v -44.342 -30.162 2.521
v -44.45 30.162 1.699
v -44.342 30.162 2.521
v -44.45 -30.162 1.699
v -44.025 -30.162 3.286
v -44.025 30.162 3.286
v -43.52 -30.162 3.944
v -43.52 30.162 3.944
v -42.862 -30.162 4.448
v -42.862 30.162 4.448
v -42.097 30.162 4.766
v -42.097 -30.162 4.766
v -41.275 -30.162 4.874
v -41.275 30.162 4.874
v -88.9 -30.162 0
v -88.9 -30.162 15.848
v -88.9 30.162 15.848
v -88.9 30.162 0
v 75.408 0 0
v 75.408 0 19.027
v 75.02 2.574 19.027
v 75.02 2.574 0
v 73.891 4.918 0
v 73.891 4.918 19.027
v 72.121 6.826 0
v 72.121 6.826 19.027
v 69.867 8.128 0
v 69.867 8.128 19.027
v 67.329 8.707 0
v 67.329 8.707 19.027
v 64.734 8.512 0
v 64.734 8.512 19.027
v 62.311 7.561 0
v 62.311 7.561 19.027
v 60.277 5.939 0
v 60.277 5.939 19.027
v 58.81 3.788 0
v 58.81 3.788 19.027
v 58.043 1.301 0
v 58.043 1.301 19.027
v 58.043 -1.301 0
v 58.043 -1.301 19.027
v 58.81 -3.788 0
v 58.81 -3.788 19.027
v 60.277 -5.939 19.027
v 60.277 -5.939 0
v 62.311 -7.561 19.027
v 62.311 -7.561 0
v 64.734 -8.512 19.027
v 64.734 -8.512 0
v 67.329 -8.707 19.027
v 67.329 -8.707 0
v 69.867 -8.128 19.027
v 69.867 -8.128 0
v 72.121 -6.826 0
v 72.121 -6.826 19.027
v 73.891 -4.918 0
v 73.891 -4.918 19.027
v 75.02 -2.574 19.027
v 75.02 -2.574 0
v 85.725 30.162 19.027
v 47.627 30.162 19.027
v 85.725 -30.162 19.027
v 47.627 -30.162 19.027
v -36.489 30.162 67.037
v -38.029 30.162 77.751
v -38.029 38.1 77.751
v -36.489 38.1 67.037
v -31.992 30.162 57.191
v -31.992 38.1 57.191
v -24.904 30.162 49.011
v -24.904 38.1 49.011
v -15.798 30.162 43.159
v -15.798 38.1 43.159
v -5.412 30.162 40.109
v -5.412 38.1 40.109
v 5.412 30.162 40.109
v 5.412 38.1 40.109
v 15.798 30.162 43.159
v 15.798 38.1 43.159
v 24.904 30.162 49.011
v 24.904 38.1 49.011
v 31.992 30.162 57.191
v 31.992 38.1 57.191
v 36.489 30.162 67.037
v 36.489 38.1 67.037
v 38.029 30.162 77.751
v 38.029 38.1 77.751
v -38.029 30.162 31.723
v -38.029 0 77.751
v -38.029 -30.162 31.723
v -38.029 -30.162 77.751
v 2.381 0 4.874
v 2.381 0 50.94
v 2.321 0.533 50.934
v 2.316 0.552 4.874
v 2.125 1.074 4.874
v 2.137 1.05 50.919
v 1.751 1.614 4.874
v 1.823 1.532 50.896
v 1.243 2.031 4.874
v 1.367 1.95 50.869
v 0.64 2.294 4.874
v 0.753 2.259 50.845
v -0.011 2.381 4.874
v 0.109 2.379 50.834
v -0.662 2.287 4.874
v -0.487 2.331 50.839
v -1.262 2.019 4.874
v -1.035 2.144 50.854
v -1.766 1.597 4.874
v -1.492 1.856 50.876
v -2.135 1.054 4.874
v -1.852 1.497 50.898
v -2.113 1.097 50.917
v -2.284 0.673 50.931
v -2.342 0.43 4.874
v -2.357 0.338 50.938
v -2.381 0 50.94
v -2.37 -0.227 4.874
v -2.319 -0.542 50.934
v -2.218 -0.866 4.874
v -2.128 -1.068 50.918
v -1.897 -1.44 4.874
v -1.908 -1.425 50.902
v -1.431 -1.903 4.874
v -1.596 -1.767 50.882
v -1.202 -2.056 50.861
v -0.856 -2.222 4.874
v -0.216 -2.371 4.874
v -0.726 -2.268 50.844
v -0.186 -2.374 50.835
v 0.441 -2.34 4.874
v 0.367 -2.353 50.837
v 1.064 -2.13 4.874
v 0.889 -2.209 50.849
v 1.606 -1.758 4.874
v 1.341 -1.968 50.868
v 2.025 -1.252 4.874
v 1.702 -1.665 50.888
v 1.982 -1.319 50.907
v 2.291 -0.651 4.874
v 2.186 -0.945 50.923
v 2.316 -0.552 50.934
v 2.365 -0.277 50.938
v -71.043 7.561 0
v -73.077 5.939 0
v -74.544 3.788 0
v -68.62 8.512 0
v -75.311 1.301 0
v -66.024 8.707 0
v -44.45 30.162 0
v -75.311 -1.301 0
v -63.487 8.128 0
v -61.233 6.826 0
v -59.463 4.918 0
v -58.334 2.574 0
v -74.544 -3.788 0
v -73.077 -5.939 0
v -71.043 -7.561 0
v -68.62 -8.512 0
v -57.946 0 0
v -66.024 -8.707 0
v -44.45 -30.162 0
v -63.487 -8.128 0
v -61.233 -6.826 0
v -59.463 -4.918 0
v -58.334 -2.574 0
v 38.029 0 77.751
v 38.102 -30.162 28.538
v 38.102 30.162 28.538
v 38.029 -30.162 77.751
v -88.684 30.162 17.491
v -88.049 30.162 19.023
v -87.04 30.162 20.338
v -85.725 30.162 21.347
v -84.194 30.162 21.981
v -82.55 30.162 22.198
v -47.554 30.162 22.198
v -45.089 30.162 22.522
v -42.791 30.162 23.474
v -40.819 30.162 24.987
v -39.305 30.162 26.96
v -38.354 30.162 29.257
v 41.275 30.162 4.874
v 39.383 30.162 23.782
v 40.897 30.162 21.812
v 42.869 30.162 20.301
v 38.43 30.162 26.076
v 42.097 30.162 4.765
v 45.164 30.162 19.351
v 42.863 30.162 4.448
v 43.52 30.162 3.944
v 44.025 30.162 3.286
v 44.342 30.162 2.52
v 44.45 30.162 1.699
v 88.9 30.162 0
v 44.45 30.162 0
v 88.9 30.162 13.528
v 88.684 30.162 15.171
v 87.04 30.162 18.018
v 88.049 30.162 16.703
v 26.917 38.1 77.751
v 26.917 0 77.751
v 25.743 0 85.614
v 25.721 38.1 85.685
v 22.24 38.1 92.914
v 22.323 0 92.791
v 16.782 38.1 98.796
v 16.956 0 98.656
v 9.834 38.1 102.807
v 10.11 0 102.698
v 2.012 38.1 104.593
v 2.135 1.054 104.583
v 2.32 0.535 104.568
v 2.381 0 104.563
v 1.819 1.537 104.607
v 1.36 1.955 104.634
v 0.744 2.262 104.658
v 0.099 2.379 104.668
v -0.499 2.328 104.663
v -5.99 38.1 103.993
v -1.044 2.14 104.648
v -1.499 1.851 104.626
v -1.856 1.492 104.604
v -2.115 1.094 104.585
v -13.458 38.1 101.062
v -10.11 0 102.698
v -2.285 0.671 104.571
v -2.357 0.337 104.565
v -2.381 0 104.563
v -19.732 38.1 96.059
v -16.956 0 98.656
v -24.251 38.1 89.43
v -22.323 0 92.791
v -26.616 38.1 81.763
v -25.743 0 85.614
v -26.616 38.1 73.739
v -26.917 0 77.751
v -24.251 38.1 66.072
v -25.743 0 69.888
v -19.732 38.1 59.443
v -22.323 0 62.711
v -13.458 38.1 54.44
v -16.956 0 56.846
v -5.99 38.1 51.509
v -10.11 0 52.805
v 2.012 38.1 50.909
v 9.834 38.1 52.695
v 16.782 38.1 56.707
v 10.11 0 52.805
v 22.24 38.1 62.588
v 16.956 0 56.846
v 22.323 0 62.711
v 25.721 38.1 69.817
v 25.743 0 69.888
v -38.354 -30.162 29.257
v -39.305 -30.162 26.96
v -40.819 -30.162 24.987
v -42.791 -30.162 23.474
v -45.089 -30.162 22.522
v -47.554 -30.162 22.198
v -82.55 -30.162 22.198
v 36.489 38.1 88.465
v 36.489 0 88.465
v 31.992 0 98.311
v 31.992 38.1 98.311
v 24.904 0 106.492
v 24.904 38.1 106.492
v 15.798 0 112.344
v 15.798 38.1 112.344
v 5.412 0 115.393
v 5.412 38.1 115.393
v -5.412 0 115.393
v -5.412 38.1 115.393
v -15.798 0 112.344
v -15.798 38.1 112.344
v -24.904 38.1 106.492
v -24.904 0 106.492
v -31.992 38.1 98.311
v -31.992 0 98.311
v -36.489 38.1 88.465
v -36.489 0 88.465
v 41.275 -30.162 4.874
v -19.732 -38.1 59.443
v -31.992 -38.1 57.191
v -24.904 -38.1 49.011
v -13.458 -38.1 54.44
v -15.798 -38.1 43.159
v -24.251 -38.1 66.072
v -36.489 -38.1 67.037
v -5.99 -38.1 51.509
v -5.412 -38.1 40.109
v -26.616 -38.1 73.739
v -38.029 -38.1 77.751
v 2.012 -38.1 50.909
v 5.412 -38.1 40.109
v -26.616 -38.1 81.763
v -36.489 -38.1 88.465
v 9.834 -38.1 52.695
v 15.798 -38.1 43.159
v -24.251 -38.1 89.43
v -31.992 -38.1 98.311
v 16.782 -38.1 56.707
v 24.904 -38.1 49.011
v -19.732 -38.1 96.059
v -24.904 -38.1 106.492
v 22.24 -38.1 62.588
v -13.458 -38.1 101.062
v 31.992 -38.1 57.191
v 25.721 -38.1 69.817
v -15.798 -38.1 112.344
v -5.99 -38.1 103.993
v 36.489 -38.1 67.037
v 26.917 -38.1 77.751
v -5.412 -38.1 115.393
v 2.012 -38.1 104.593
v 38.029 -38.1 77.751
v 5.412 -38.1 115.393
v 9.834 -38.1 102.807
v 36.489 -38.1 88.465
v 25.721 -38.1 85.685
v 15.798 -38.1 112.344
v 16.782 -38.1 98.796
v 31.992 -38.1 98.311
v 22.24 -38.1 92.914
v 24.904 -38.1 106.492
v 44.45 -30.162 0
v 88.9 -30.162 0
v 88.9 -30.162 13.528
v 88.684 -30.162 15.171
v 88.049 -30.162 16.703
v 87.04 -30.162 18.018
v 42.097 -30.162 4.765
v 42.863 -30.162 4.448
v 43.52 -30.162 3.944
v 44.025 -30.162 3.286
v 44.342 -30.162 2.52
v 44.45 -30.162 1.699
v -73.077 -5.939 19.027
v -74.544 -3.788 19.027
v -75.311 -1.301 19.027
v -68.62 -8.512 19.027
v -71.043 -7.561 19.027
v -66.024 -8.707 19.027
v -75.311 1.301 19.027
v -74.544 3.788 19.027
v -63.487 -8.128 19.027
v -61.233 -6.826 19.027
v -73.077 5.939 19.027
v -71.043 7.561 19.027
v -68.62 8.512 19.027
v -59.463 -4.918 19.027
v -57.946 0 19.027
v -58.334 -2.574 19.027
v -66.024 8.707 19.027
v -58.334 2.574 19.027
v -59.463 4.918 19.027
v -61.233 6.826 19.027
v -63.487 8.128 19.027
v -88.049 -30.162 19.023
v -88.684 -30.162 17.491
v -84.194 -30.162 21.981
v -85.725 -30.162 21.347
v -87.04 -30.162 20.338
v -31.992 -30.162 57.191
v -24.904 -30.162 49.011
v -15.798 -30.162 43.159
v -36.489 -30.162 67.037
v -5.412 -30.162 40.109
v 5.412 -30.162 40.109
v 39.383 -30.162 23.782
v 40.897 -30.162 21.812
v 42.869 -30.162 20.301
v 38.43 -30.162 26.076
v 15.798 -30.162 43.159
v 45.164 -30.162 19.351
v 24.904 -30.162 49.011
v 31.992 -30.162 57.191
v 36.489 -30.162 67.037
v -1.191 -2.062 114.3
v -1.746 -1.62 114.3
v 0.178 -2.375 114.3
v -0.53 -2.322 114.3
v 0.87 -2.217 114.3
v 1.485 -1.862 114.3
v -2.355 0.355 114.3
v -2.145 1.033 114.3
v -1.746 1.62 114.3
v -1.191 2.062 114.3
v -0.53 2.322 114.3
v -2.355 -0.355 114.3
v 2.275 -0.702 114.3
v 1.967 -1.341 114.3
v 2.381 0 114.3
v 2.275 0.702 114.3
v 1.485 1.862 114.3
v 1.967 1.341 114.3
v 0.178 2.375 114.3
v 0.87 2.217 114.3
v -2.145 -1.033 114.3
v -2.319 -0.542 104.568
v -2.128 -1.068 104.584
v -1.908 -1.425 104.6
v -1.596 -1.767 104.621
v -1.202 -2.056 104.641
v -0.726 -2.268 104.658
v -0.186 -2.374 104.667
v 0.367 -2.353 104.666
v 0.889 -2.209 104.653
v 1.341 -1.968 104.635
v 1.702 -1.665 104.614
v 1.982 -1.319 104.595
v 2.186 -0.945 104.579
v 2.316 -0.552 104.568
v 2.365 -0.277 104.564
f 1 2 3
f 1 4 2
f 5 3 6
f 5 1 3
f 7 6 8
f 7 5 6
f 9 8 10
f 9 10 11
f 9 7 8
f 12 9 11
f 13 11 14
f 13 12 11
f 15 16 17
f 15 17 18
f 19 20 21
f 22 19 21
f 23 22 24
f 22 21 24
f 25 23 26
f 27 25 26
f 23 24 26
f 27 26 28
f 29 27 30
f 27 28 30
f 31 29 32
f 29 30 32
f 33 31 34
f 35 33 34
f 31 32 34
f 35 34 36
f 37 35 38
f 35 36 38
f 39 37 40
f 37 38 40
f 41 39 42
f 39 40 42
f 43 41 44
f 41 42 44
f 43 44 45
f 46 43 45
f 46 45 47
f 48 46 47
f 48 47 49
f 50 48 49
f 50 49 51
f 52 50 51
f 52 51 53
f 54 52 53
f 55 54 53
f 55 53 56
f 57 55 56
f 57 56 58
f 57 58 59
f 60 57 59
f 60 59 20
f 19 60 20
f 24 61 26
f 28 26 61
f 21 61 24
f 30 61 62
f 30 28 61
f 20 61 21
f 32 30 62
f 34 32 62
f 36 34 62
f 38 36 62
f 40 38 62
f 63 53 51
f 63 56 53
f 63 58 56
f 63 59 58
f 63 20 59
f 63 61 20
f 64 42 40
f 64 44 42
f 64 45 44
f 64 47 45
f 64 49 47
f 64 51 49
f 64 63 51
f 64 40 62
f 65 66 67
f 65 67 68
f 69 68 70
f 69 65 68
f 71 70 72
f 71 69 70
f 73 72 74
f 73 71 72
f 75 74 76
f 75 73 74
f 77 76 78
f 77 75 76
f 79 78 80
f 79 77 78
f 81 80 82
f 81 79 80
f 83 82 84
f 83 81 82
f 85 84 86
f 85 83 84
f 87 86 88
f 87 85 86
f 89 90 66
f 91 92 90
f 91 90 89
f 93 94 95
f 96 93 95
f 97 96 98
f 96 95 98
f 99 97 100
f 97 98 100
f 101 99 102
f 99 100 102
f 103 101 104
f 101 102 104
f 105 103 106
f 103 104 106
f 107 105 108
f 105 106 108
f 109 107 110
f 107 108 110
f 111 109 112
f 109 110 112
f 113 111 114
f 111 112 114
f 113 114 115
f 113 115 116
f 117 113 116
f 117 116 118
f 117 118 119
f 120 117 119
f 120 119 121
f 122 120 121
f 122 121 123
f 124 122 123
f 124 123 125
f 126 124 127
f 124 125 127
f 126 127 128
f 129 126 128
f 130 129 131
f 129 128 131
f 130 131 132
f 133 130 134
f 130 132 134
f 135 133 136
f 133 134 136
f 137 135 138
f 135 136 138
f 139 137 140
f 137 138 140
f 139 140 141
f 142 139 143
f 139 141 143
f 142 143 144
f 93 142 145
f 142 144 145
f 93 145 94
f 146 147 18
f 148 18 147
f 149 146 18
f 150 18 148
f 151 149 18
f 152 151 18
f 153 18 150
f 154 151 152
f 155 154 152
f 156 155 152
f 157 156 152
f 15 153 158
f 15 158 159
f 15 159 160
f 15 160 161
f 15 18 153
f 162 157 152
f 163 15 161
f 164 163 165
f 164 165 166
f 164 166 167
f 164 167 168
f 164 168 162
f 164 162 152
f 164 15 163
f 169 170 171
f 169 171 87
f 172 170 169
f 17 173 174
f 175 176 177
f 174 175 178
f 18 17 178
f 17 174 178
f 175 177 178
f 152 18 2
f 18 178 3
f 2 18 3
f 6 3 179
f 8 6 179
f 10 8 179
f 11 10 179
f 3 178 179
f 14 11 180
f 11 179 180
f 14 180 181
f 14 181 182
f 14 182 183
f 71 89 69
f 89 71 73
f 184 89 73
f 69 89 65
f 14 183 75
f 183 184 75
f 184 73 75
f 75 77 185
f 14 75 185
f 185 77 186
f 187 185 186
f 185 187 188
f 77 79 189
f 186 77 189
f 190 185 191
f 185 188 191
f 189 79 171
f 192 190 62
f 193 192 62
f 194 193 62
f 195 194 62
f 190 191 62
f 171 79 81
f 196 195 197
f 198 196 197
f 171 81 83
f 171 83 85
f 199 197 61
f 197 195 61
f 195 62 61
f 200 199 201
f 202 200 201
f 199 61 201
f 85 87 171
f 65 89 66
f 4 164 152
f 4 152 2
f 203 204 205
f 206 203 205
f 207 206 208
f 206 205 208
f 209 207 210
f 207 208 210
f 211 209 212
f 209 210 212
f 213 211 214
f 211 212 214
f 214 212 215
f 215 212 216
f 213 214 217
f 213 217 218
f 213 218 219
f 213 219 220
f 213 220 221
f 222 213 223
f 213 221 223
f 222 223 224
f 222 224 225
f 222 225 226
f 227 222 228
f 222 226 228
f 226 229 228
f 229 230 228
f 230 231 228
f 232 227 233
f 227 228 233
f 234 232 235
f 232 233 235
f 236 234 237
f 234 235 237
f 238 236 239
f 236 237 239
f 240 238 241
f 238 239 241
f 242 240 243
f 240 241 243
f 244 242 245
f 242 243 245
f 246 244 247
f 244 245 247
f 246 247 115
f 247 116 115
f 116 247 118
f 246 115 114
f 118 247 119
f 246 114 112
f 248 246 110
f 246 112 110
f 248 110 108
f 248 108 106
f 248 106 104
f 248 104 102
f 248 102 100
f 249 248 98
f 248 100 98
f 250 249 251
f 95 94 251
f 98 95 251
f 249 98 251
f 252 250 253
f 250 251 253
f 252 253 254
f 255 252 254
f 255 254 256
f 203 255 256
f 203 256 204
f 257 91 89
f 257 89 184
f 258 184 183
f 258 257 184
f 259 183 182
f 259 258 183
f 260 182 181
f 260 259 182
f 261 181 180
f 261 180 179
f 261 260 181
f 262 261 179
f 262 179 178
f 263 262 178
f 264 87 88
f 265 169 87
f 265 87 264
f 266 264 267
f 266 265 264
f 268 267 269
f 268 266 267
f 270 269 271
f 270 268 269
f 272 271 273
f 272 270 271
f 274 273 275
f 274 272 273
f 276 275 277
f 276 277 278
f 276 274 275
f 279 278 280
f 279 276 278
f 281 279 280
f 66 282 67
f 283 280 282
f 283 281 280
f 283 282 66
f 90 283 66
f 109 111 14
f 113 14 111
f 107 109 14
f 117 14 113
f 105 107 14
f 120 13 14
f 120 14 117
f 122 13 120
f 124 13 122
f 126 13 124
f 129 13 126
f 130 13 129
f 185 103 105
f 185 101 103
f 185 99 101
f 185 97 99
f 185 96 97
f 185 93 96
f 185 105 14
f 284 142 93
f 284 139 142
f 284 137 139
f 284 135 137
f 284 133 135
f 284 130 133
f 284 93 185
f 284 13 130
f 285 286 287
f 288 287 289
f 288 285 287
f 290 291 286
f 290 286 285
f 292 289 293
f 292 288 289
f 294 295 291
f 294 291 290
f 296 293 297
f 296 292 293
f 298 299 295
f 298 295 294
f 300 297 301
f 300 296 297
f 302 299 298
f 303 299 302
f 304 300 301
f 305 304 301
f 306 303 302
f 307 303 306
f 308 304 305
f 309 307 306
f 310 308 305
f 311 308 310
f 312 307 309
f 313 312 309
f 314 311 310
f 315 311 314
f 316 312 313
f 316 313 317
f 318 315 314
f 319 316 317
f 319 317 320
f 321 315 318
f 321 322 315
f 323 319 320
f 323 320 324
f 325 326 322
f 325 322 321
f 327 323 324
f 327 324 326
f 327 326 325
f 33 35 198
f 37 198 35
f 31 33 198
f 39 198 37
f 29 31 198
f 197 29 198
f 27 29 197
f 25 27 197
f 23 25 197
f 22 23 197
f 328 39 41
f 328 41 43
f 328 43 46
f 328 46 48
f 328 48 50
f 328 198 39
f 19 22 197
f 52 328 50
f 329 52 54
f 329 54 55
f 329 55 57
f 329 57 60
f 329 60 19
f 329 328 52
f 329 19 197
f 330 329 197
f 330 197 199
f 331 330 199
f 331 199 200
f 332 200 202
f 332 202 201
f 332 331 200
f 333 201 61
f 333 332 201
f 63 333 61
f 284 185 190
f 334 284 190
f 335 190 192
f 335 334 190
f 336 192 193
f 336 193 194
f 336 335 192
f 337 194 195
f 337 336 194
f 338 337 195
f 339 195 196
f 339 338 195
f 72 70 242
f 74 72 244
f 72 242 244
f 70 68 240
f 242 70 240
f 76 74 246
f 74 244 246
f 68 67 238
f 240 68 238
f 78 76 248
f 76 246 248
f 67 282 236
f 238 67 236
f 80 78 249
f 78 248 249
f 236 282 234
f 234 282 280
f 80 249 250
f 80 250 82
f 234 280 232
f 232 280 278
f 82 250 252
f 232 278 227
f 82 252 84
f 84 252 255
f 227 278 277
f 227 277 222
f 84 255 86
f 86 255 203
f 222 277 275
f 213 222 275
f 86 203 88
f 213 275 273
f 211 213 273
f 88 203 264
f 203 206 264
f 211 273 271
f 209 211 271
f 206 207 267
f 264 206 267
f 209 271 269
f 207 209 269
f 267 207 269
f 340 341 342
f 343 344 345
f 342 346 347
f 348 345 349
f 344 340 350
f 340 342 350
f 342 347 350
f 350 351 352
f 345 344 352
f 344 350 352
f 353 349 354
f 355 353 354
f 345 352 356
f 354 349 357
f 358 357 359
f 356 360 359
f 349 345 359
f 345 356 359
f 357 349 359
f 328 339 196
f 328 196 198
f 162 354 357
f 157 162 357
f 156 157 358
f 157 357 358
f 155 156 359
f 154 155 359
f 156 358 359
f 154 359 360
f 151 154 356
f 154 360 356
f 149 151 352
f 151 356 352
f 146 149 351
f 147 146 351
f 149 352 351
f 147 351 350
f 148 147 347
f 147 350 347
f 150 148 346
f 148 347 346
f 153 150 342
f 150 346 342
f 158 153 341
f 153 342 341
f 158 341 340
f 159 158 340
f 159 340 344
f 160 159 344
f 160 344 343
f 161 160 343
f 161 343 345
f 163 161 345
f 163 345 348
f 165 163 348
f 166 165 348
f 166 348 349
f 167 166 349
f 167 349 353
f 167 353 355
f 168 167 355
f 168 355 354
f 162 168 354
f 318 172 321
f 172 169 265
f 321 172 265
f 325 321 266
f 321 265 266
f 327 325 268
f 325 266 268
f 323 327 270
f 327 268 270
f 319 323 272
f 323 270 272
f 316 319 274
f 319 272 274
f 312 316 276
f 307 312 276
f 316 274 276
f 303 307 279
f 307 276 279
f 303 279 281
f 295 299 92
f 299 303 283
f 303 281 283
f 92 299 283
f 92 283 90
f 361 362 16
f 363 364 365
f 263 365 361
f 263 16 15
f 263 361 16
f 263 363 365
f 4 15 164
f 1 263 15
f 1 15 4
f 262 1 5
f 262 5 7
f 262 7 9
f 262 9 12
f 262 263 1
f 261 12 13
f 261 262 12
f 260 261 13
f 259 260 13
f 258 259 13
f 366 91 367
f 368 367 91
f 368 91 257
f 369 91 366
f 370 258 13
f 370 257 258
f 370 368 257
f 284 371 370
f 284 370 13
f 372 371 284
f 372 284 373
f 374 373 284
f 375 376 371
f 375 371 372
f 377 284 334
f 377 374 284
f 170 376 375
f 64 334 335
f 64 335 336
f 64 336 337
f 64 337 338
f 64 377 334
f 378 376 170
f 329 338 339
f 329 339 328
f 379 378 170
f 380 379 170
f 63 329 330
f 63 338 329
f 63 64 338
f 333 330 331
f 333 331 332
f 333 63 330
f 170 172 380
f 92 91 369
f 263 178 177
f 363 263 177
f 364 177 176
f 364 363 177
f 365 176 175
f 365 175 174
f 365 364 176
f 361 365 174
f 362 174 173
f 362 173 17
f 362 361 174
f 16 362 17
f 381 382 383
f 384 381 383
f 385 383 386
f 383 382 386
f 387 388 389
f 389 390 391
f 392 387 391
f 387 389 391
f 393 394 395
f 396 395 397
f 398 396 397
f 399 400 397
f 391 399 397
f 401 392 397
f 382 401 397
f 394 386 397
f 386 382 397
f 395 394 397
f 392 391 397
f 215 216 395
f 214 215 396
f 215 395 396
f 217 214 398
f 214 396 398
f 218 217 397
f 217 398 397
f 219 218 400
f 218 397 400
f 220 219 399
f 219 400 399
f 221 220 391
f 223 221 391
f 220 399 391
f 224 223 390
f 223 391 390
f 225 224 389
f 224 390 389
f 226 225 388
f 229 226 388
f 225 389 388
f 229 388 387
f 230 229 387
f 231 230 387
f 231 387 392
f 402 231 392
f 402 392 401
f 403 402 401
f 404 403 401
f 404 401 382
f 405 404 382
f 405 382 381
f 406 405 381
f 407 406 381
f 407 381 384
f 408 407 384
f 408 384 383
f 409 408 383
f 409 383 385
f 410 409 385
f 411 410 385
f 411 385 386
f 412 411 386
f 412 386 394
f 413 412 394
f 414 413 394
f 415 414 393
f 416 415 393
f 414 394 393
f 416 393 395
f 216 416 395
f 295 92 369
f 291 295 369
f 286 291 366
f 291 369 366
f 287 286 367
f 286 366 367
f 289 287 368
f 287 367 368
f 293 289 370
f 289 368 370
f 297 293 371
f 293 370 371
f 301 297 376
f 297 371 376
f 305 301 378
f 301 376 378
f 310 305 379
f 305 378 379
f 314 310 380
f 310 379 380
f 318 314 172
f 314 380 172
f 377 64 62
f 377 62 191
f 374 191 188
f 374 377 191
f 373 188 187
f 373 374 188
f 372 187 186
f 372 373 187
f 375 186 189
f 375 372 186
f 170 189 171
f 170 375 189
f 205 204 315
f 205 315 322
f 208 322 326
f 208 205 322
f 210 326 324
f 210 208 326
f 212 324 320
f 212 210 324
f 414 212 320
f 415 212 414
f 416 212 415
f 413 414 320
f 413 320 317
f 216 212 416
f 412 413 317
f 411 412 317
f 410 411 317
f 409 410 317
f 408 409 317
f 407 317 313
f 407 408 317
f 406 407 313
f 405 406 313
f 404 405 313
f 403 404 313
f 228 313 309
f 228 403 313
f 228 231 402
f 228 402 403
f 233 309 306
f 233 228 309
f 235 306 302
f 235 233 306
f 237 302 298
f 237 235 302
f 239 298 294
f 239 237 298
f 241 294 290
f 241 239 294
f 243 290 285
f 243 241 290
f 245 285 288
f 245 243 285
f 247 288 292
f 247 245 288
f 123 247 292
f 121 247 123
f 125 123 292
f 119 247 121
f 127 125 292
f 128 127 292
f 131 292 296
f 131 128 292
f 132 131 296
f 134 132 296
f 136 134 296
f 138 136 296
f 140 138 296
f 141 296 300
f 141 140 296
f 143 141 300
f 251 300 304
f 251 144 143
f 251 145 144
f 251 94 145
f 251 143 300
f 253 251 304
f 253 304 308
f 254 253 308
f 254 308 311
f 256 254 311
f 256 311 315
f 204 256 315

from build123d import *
from build123d import SkipClean  # not in build123d's __all__

# Parameters (mm, degrees)
F1_DEPTH = 30.1625
F0_R     = 26.9169820067
F2_DEPTH = 38.1
F6_D     = 4.7625
F6_DEPTH = 114.301
F7_D     = 17.4625
F7_DEPTH = 19.0282397391


with BuildPart() as f1:
    # F0 (on Front) → F1 (new body, symmetric)
    with BuildSketch(Plane.XZ):
        with BuildLine():
            ThreePointArc((41.2750103626, 4.8735072878), (43.5200676937, 3.9435676542), (44.4499999995, 1.6985072878))
            Line((44.4499999995, 1.6985072878), (44.4499999995, 0))
            Line((44.4499999995, 0), (88.8999999995, 0))
            Line((88.8999999995, 0), (88.8999999995, 13.5279764081))
            ThreePointArc((88.8999999995, 13.5279764081), (88.0492603051, 16.7029781548), (85.7249965061, 19.0272397391))
            Line((85.7249965061, 19.0272397391), (47.6269838993, 19.0272397391))
            ThreePointArc((47.6269838993, 19.0272397391), (40.8967892902, 21.812053872), (38.1019943796, 28.5381099704))
            Line((38.1019943796, 28.5381099704), (38.0289897107, 77.7511383134))
            ThreePointArc((38.0289897107, 77.7511383134), (-2e-10, 39.7221486024), (-38.0289897112, 77.7511383134))
            Line((-38.0289897112, 77.7511383134), (-38.0289897112, 31.7225298162))
            ThreePointArc((-38.0289897112, 31.7225298162), (-40.8187976204, 24.9873377254), (-47.5539897112, 22.1975298162))
            Line((-47.5539897112, 22.1975298162), (-82.55, 22.1975298162))
            ThreePointArc((-82.55, 22.1975298162), (-87.0401280605, 20.3376578767), (-88.9, 15.8475298162))
            Line((-88.9, 15.8475298162), (-88.9, 0))
            Line((-88.9, 0), (-44.45, 0))
            Line((-44.45, 0), (-44.45, 1.6987767268))
            ThreePointArc((-44.45, 1.6987767268), (-43.5200603664, 3.943844421), (-41.274989637, 4.8737767268))
            Line((-41.274989637, 4.8737767268), (41.2750103626, 4.8735072878))
        make_face()
    extrude(amount=F1_DEPTH, both=True)

    # F0 (on Front) → F2 (join, symmetric)
    with BuildSketch(Plane.XZ):
        with BuildLine():
            ThreePointArc((-38.0289897112, 77.7511383134), (-2e-10, 39.7221486024), (38.0289897107, 77.7511383134))
            ThreePointArc((38.0289897107, 77.7511383134), (-2e-10, 115.7801280244), (-38.0289897112, 77.7511383134))
        make_face()
        with Locations((-2e-10, 77.7511383134)):
            Circle(F0_R, mode=Mode.SUBTRACT)
    with SkipClean():  # cleaning this boolean's faces spoils the solid; the shape is the same uncleaned
        extrude(amount=F2_DEPTH, both=True)

    # F6 (through all, one way)
    with BuildSketch(Plane.XY.offset(114.3)):
        with Locations((0, 0)):
            Circle(F6_D / 2)
    extrude(amount=-F6_DEPTH, mode=Mode.SUBTRACT)

    # F7 (through all, one way)
    with BuildSketch(Plane.XY.offset(19.0272397391)):
        with Locations((-66.6769838993, 0), (66.6769838993, 0)):
            Circle(F7_D / 2)
    extrude(amount=-F7_DEPTH, mode=Mode.SUBTRACT)


solid = f1.part
